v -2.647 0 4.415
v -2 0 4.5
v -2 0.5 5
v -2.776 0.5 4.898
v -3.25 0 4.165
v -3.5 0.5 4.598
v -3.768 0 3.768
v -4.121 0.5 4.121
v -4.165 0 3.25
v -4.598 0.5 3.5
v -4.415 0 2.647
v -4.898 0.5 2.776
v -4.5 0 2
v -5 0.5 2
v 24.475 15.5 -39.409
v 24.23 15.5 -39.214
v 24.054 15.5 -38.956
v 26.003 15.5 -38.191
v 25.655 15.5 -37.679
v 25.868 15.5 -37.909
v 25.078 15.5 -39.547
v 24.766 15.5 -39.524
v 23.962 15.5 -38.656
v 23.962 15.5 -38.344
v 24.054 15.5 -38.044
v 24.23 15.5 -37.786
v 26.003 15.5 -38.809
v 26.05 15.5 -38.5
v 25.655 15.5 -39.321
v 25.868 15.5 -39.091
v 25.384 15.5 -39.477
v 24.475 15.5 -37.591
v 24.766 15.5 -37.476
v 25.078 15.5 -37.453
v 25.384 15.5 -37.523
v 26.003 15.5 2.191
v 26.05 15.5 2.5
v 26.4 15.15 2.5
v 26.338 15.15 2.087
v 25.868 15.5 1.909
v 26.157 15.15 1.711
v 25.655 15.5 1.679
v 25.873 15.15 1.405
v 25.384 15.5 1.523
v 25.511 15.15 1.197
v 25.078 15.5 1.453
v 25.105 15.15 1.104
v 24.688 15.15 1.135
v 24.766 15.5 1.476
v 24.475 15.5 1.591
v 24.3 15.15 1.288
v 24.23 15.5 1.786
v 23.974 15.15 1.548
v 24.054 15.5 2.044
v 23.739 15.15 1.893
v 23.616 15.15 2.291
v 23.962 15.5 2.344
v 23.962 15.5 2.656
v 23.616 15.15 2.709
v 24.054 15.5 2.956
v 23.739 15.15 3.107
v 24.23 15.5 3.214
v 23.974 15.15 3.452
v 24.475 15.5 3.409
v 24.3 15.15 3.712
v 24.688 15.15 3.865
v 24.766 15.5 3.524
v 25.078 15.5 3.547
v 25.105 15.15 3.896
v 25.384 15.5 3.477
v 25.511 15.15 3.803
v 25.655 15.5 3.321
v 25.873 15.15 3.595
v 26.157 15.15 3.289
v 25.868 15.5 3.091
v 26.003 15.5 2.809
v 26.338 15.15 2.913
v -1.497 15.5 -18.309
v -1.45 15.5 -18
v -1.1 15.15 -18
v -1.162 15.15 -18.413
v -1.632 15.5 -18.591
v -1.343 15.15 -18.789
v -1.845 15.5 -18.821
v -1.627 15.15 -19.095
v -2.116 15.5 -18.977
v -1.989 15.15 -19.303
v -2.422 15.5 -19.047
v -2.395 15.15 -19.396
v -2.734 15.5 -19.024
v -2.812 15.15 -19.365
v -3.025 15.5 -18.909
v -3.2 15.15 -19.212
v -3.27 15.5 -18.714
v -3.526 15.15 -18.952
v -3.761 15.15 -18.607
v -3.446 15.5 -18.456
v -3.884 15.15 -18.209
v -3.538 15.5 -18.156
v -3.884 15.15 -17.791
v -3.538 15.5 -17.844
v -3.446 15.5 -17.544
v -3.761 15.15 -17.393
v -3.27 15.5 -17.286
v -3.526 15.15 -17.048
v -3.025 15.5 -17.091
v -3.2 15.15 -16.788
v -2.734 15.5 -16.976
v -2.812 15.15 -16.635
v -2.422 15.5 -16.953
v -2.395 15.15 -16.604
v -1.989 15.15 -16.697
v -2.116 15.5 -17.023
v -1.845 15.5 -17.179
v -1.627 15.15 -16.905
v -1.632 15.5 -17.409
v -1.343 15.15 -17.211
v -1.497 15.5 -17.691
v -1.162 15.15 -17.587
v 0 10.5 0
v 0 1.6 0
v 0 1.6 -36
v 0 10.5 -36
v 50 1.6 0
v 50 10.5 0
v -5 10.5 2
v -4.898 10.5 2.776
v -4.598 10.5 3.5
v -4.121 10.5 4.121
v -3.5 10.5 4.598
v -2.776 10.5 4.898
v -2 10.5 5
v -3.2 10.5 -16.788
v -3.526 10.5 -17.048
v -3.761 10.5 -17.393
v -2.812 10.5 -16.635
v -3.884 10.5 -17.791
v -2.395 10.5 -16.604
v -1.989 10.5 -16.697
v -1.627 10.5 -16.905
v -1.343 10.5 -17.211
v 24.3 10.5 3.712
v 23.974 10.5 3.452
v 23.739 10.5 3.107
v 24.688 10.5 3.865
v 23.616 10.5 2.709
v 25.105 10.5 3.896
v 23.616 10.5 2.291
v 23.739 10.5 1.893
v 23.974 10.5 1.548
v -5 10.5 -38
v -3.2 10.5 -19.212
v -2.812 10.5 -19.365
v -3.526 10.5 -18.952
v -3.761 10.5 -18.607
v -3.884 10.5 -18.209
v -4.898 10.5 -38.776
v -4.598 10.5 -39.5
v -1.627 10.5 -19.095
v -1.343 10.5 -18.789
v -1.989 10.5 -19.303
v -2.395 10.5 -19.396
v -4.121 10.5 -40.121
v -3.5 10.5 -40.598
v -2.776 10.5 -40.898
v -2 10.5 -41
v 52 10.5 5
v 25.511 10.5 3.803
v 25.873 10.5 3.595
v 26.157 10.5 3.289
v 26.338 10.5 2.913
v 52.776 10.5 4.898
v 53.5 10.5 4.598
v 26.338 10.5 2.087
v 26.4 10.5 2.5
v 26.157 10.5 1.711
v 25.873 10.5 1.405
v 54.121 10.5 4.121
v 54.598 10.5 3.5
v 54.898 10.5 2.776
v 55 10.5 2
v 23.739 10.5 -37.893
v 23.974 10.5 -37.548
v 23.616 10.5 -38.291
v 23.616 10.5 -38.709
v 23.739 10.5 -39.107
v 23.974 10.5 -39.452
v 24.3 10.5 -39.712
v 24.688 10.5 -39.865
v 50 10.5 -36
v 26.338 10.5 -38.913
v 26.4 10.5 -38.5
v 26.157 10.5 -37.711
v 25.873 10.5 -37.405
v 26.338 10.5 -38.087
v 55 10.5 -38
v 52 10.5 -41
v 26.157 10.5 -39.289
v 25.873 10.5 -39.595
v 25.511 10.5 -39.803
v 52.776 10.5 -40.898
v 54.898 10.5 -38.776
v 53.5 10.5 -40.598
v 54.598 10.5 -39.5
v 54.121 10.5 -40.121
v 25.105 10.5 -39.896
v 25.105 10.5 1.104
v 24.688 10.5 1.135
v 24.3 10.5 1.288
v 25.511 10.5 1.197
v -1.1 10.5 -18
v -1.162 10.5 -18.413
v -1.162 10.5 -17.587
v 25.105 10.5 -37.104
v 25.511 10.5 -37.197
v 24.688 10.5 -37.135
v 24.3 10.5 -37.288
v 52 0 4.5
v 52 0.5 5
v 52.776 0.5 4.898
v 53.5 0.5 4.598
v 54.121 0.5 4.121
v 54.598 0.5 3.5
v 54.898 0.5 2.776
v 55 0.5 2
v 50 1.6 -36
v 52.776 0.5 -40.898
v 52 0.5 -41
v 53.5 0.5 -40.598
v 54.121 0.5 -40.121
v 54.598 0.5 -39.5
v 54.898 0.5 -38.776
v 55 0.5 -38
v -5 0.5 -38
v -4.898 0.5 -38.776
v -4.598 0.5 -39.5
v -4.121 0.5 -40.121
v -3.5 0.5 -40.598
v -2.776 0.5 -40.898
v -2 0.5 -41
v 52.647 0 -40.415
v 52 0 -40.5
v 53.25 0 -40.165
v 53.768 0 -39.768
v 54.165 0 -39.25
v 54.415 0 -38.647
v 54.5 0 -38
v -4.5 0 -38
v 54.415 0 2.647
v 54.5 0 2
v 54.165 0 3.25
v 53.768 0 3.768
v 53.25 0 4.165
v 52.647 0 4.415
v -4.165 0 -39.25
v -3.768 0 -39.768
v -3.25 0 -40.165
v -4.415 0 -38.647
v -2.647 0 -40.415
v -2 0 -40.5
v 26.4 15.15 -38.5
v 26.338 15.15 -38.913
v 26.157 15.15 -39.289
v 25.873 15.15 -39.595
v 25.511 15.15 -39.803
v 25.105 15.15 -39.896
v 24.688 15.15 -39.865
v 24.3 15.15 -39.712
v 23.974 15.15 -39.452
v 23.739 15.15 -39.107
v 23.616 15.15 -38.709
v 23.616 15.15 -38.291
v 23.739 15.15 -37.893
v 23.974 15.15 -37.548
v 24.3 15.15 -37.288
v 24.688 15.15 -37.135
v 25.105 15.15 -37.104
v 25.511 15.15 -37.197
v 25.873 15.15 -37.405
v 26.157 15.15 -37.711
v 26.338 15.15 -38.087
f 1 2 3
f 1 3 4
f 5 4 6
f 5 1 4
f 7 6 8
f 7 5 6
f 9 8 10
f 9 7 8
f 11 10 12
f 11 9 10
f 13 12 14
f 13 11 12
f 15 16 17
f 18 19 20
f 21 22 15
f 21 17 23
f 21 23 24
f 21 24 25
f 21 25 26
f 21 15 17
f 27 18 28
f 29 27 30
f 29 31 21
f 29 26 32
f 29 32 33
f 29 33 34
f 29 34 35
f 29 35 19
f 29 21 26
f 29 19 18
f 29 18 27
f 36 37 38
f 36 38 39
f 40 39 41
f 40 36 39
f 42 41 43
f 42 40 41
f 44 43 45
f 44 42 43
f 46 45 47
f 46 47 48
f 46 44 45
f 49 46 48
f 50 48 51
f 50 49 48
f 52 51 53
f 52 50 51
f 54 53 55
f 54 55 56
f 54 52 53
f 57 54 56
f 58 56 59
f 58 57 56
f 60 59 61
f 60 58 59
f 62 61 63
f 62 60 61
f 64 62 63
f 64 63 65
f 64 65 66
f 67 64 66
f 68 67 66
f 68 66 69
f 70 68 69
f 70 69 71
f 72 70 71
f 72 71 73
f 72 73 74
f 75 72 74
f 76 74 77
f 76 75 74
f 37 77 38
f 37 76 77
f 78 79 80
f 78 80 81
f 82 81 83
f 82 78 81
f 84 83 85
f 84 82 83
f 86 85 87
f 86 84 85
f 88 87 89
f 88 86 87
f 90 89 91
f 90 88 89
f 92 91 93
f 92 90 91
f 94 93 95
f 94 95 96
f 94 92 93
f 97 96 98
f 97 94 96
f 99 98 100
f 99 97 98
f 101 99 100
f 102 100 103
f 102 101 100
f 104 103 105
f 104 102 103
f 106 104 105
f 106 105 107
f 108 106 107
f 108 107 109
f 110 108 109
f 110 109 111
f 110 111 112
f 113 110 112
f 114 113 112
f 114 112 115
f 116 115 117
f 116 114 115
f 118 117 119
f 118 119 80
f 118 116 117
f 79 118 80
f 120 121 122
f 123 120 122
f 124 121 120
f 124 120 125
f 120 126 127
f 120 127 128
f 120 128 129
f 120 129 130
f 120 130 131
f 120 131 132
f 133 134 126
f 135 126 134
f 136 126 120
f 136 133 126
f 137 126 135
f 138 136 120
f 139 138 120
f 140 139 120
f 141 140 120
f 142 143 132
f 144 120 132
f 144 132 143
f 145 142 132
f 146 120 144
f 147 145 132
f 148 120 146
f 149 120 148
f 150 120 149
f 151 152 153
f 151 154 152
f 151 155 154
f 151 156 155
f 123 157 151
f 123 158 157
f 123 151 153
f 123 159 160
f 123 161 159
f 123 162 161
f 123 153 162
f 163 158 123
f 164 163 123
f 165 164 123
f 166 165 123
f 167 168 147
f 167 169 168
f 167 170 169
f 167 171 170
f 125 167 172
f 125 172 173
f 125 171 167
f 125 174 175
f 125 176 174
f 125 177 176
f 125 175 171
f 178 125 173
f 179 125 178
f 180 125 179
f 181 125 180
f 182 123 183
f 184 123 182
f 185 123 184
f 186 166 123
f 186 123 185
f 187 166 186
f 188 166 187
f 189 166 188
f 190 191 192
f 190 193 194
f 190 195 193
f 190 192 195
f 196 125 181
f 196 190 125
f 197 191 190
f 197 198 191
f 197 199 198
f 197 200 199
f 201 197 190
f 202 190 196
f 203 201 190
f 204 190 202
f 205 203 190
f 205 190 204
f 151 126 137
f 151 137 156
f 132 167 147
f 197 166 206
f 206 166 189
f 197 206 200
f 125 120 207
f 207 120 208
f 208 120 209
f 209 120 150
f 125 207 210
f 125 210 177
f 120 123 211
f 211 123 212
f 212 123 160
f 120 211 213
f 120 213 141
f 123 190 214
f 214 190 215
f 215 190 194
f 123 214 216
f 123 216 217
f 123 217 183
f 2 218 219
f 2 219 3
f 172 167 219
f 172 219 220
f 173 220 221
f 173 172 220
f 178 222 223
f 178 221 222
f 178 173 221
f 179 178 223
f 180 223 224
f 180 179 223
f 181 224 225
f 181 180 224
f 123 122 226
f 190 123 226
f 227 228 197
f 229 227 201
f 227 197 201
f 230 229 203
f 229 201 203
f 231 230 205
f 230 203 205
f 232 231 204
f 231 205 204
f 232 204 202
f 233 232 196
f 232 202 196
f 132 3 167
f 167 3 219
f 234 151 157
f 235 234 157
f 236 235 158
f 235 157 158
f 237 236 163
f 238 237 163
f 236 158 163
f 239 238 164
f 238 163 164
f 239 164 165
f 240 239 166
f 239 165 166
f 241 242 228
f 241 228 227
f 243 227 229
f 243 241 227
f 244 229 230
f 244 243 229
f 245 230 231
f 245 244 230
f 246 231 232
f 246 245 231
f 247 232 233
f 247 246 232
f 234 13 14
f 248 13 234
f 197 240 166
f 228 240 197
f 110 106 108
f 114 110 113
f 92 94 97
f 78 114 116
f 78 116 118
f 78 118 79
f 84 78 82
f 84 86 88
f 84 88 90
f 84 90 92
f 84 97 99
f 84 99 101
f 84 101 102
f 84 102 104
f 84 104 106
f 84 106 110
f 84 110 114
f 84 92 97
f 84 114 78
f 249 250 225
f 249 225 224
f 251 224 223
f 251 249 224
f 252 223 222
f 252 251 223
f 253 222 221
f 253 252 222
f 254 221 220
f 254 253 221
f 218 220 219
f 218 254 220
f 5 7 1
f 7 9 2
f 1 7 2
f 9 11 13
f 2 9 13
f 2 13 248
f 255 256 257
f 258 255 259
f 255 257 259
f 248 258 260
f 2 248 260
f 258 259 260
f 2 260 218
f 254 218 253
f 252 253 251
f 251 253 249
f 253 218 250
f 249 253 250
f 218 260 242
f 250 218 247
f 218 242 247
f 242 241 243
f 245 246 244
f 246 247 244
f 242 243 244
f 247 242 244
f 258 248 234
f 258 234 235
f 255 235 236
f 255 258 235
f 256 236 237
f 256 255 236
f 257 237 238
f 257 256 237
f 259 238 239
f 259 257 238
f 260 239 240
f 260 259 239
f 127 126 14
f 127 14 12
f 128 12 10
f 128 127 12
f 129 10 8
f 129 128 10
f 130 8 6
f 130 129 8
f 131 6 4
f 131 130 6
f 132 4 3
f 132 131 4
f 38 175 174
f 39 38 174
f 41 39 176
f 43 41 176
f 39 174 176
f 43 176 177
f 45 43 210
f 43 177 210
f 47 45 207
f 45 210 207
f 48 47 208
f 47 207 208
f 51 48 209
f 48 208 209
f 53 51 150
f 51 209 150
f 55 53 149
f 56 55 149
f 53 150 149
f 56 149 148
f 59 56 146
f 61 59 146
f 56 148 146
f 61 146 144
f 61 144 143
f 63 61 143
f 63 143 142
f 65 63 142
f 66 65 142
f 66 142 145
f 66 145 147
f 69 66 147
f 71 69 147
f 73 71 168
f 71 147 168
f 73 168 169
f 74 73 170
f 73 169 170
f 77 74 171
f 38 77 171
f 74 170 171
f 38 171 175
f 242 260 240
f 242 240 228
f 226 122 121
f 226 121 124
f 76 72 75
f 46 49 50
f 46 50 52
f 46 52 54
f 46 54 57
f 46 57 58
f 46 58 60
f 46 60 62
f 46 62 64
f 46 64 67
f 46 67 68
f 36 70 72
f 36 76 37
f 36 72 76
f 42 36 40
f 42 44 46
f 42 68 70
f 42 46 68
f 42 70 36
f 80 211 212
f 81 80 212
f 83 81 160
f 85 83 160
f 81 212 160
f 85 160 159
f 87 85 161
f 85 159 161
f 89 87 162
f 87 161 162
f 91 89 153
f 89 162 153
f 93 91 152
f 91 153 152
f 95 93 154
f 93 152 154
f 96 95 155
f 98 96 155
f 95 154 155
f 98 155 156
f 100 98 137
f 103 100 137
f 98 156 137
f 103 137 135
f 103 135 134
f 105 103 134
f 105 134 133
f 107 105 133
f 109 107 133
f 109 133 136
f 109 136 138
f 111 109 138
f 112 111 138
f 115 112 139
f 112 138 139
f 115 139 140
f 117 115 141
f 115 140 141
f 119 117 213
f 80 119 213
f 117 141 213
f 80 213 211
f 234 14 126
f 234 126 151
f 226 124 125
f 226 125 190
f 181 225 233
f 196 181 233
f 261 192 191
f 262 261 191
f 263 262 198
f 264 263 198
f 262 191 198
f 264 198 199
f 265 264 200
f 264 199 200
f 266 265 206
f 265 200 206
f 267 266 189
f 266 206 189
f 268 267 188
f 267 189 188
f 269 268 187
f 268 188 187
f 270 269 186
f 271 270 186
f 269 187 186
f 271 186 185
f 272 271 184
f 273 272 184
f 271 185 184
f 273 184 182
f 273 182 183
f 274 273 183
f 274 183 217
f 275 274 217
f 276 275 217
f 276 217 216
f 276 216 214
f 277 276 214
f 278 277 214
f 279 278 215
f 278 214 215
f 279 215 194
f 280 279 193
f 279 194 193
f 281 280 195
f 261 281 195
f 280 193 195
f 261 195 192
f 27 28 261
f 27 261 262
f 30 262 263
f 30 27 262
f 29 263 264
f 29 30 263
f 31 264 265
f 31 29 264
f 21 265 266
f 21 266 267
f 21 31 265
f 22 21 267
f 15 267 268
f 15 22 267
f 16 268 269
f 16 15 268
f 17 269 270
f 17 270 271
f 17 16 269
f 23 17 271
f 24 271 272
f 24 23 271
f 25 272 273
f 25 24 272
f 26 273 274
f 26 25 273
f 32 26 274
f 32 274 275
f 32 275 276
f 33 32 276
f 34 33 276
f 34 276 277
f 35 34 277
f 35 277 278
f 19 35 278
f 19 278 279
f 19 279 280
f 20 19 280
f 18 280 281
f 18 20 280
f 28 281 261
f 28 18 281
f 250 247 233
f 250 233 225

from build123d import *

# Parameters (mm, degrees)
SKETCH1_W           = 60
SKETCH1_H           = 46
SKETCH1_W_2         = 50
SKETCH1_H_2         = 36
BOSS_EXTRUDE1_DEPTH = 10.5
SKETCH2_W           = 50
SKETCH2_H           = 36
BOSS_EXTRUDE2_DEPTH = 1.6
FILLET1_R           = 3
SKETCH3_R           = 1.4
BOSS_EXTRUDE3_DEPTH = 5
CHAMFER1_SIZE       = 0.35
CHAMFER2_SIZE       = 0.5


with BuildPart() as part:
    # Sketch1 → Boss-Extrude1 (new body)
    with BuildSketch(Plane(origin=(0, 0, 0), x_dir=(1, 0, 0), z_dir=(0, 1, 0))):
        with Locations((25, 18)):
            Rectangle(SKETCH1_W, SKETCH1_H)
        with Locations((25, 18)):
            Rectangle(SKETCH1_W_2, SKETCH1_H_2, mode=Mode.SUBTRACT)
    extrude(amount=BOSS_EXTRUDE1_DEPTH)

    # Sketch2 → Boss-Extrude2 (add)
    with BuildSketch(Plane(origin=(0, 0, 0), x_dir=(1, 0, 0), z_dir=(0, 1, 0))):
        with Locations((25, 18)):
            Rectangle(SKETCH2_W, SKETCH2_H)
    extrude(amount=BOSS_EXTRUDE2_DEPTH)

    # Fillet1
    fillet1_edges = [part.edges().sort_by_distance(p)[0] for p in [
        (-5, 5.25, -41),
        (55, 5.25, -41),
        (55, 5.25, 5),
        (-5, 5.25, 5),
    ]]
    fillet(fillet1_edges, radius=FILLET1_R)

    # Sketch3 → Boss-Extrude3 (add)
    with BuildSketch(Plane(origin=(0, 10.5, 0), x_dir=(1, 0, 0), z_dir=(0, 1, 0))):
        with Locations((25, 38.5)):
            Circle(SKETCH3_R)
        with Locations((-2.5, 18)):
            Circle(SKETCH3_R)
        with Locations((25, -2.5)):
            Circle(SKETCH3_R)
    extrude(amount=BOSS_EXTRUDE3_DEPTH)

    # Chamfer1
    chamfer1_edges = [part.edges().sort_by_distance(p)[0] for p in [
        (23.6, 15.5, -38.5),
        (-3.9, 15.5, -18),
        (23.6, 15.5, 2.5),
    ]]
    chamfer(chamfer1_edges, length=CHAMFER1_SIZE)

    # Chamfer2
    chamfer2_edges = [part.edges().sort_by_distance(p)[0] for p in [
        (25, 0, -41),
        (-5, 0, -18),
        (55, 0, -18),
        (25, 0, 5),
        (-4.121320344, 0, 4.121320344),
        (54.121320344, 0, 4.121320344),
        (-4.121320344, 0, -40.121320344),
        (54.121320344, 0, -40.121320344),
    ]]
    chamfer(chamfer2_edges, length=CHAMFER2_SIZE)


solid = part.part
